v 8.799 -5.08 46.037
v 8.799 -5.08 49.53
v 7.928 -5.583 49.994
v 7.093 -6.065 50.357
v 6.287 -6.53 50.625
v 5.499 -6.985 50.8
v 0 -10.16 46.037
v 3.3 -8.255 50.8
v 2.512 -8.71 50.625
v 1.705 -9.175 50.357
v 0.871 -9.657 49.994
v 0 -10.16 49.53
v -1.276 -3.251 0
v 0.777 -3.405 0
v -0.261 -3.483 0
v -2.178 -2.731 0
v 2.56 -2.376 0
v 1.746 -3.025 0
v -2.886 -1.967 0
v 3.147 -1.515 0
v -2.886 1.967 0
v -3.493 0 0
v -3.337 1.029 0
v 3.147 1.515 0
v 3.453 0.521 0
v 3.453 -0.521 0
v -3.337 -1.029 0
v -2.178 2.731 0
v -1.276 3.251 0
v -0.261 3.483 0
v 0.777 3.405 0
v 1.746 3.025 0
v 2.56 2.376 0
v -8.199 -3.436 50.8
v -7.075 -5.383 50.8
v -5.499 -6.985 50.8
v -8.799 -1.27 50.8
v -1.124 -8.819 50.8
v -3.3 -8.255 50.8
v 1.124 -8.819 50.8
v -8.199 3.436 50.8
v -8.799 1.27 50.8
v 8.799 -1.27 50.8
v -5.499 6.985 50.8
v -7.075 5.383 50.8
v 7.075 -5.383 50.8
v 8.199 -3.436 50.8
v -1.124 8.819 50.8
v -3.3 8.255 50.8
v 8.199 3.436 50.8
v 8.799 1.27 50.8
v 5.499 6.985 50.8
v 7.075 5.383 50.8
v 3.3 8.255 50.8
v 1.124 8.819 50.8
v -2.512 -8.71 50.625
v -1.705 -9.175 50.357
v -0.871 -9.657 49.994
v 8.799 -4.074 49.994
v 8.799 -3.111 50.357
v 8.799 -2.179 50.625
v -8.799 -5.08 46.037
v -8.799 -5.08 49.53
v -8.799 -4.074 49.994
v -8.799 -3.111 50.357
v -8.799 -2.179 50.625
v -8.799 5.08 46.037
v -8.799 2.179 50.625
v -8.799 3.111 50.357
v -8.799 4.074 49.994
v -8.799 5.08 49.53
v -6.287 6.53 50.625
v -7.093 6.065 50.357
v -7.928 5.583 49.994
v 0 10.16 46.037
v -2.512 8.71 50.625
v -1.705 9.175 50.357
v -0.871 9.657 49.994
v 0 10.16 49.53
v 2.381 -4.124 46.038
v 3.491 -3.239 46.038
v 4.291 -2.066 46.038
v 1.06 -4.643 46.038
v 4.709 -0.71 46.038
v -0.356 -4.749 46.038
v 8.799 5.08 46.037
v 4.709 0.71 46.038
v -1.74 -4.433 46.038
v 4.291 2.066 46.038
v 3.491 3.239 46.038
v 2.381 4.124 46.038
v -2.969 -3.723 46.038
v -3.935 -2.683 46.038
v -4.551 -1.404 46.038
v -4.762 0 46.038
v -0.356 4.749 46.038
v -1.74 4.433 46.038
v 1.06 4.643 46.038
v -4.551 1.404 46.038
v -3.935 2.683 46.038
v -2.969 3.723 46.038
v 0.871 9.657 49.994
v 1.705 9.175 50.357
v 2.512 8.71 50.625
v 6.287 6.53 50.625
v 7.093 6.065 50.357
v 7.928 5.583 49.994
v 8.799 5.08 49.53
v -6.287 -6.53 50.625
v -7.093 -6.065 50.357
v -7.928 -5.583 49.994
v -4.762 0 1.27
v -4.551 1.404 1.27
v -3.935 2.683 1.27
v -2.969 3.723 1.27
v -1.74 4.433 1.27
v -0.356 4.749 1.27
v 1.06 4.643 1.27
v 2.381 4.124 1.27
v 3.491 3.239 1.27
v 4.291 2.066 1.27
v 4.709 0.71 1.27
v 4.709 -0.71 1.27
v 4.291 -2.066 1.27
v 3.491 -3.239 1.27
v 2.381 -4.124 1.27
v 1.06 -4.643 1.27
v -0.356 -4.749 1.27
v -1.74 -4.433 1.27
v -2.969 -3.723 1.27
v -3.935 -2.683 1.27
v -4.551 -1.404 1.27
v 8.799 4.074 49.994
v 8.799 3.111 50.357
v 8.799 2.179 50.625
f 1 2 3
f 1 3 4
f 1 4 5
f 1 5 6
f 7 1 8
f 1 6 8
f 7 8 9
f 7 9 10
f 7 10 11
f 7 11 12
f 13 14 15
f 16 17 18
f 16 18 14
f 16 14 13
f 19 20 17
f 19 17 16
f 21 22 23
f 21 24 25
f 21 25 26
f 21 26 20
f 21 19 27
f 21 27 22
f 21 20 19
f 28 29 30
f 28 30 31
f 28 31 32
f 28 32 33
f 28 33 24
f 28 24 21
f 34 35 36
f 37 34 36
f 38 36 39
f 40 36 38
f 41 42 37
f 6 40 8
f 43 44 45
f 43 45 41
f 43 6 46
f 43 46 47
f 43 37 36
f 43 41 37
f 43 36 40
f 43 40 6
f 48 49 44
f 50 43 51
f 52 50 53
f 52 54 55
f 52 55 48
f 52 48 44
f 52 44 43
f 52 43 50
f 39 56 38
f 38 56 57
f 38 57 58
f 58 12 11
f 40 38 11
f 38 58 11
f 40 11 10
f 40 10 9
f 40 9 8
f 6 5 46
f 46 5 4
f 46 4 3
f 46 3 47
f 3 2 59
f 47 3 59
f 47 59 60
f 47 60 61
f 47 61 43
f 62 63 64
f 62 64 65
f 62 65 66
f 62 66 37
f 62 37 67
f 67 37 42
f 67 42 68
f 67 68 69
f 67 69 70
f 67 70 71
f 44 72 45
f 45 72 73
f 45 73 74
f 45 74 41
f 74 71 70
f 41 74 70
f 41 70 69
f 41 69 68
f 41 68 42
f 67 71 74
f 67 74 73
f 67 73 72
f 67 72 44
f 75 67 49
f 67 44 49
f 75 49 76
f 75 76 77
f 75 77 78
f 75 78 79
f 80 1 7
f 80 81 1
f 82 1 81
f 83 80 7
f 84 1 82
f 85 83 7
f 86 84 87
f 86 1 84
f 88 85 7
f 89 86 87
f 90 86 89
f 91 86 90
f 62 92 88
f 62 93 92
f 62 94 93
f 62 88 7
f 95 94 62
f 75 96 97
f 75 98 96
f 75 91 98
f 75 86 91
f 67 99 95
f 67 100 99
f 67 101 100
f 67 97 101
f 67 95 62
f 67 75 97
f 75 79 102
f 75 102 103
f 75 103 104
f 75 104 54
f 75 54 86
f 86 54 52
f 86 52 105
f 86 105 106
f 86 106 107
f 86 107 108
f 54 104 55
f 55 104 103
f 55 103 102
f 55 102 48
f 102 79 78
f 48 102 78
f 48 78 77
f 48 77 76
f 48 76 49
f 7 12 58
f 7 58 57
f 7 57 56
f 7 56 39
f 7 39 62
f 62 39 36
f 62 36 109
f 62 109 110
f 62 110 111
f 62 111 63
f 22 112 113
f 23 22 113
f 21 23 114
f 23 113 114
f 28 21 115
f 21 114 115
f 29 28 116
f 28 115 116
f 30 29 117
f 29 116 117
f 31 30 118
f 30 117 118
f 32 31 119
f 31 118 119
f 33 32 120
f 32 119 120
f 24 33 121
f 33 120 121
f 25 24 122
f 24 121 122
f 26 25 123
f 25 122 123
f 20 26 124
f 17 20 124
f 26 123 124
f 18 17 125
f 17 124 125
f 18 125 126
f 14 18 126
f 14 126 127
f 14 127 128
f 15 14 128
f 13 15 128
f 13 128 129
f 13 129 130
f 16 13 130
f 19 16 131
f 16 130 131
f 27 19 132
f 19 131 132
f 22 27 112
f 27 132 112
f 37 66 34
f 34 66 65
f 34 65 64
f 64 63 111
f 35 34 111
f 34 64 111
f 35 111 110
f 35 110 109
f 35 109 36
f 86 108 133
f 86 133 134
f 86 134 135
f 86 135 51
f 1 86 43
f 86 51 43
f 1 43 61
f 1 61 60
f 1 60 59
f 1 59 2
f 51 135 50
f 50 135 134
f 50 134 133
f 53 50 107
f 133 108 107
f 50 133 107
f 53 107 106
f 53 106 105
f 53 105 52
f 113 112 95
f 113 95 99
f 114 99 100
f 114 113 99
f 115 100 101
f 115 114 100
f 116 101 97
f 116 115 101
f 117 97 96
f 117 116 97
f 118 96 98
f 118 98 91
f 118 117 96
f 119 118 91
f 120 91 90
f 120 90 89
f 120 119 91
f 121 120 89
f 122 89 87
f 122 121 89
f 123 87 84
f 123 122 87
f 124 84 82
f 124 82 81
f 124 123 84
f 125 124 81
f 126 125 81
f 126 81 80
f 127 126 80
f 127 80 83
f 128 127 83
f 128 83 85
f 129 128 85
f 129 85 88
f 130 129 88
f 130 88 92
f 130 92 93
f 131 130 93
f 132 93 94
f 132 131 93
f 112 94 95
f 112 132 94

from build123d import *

# Parameters (mm, degrees)
F2_R     = 12.7
F3_DEPTH = 4.7625
F4_SIZE  = 1.27


with BuildPart() as f1:
    # F0 (on Front) → F1 (revolve)
    with BuildSketch(Plane.XZ):
        Polygon((-4.7625, 0), (0, 0), (0, 50.8), (-10.16, 50.8), (-10.16, 46.0375), (-4.7625, 46.0375), align=None)
    revolve(axis=Axis((0, 0, 25.4), (0, 0, -1)))

    # F2 (on face) → F3 (cut, through all)
    with BuildSketch(Plane.XY.offset(50.8)):
        Circle(F2_R)
        Polygon((-8.798818, 5.08), (0, 10.16), (8.798818, 5.08), (8.798818, -5.08), (0, -10.16), (-8.798818, -5.08), align=None, mode=Mode.SUBTRACT)
    extrude(amount=-F3_DEPTH, mode=Mode.SUBTRACT)

    # F4
    f4_edges = [f1.edges().sort_by_distance(p)[0] for p in [
        (4.7625, 0, 0),
    ]]
    chamfer(f4_edges, length=F4_SIZE)

    # F5 (on Right) → F6 (revolve, cut)
    with BuildSketch(Plane.YZ):
        Polygon((8.89, 50.8), (10.16, 49.53), (10.16, 50.8), align=None)
    revolve(axis=Axis((0, 0, 27.040424), (0, 0, 1)), mode=Mode.SUBTRACT)


solid = f1.part
